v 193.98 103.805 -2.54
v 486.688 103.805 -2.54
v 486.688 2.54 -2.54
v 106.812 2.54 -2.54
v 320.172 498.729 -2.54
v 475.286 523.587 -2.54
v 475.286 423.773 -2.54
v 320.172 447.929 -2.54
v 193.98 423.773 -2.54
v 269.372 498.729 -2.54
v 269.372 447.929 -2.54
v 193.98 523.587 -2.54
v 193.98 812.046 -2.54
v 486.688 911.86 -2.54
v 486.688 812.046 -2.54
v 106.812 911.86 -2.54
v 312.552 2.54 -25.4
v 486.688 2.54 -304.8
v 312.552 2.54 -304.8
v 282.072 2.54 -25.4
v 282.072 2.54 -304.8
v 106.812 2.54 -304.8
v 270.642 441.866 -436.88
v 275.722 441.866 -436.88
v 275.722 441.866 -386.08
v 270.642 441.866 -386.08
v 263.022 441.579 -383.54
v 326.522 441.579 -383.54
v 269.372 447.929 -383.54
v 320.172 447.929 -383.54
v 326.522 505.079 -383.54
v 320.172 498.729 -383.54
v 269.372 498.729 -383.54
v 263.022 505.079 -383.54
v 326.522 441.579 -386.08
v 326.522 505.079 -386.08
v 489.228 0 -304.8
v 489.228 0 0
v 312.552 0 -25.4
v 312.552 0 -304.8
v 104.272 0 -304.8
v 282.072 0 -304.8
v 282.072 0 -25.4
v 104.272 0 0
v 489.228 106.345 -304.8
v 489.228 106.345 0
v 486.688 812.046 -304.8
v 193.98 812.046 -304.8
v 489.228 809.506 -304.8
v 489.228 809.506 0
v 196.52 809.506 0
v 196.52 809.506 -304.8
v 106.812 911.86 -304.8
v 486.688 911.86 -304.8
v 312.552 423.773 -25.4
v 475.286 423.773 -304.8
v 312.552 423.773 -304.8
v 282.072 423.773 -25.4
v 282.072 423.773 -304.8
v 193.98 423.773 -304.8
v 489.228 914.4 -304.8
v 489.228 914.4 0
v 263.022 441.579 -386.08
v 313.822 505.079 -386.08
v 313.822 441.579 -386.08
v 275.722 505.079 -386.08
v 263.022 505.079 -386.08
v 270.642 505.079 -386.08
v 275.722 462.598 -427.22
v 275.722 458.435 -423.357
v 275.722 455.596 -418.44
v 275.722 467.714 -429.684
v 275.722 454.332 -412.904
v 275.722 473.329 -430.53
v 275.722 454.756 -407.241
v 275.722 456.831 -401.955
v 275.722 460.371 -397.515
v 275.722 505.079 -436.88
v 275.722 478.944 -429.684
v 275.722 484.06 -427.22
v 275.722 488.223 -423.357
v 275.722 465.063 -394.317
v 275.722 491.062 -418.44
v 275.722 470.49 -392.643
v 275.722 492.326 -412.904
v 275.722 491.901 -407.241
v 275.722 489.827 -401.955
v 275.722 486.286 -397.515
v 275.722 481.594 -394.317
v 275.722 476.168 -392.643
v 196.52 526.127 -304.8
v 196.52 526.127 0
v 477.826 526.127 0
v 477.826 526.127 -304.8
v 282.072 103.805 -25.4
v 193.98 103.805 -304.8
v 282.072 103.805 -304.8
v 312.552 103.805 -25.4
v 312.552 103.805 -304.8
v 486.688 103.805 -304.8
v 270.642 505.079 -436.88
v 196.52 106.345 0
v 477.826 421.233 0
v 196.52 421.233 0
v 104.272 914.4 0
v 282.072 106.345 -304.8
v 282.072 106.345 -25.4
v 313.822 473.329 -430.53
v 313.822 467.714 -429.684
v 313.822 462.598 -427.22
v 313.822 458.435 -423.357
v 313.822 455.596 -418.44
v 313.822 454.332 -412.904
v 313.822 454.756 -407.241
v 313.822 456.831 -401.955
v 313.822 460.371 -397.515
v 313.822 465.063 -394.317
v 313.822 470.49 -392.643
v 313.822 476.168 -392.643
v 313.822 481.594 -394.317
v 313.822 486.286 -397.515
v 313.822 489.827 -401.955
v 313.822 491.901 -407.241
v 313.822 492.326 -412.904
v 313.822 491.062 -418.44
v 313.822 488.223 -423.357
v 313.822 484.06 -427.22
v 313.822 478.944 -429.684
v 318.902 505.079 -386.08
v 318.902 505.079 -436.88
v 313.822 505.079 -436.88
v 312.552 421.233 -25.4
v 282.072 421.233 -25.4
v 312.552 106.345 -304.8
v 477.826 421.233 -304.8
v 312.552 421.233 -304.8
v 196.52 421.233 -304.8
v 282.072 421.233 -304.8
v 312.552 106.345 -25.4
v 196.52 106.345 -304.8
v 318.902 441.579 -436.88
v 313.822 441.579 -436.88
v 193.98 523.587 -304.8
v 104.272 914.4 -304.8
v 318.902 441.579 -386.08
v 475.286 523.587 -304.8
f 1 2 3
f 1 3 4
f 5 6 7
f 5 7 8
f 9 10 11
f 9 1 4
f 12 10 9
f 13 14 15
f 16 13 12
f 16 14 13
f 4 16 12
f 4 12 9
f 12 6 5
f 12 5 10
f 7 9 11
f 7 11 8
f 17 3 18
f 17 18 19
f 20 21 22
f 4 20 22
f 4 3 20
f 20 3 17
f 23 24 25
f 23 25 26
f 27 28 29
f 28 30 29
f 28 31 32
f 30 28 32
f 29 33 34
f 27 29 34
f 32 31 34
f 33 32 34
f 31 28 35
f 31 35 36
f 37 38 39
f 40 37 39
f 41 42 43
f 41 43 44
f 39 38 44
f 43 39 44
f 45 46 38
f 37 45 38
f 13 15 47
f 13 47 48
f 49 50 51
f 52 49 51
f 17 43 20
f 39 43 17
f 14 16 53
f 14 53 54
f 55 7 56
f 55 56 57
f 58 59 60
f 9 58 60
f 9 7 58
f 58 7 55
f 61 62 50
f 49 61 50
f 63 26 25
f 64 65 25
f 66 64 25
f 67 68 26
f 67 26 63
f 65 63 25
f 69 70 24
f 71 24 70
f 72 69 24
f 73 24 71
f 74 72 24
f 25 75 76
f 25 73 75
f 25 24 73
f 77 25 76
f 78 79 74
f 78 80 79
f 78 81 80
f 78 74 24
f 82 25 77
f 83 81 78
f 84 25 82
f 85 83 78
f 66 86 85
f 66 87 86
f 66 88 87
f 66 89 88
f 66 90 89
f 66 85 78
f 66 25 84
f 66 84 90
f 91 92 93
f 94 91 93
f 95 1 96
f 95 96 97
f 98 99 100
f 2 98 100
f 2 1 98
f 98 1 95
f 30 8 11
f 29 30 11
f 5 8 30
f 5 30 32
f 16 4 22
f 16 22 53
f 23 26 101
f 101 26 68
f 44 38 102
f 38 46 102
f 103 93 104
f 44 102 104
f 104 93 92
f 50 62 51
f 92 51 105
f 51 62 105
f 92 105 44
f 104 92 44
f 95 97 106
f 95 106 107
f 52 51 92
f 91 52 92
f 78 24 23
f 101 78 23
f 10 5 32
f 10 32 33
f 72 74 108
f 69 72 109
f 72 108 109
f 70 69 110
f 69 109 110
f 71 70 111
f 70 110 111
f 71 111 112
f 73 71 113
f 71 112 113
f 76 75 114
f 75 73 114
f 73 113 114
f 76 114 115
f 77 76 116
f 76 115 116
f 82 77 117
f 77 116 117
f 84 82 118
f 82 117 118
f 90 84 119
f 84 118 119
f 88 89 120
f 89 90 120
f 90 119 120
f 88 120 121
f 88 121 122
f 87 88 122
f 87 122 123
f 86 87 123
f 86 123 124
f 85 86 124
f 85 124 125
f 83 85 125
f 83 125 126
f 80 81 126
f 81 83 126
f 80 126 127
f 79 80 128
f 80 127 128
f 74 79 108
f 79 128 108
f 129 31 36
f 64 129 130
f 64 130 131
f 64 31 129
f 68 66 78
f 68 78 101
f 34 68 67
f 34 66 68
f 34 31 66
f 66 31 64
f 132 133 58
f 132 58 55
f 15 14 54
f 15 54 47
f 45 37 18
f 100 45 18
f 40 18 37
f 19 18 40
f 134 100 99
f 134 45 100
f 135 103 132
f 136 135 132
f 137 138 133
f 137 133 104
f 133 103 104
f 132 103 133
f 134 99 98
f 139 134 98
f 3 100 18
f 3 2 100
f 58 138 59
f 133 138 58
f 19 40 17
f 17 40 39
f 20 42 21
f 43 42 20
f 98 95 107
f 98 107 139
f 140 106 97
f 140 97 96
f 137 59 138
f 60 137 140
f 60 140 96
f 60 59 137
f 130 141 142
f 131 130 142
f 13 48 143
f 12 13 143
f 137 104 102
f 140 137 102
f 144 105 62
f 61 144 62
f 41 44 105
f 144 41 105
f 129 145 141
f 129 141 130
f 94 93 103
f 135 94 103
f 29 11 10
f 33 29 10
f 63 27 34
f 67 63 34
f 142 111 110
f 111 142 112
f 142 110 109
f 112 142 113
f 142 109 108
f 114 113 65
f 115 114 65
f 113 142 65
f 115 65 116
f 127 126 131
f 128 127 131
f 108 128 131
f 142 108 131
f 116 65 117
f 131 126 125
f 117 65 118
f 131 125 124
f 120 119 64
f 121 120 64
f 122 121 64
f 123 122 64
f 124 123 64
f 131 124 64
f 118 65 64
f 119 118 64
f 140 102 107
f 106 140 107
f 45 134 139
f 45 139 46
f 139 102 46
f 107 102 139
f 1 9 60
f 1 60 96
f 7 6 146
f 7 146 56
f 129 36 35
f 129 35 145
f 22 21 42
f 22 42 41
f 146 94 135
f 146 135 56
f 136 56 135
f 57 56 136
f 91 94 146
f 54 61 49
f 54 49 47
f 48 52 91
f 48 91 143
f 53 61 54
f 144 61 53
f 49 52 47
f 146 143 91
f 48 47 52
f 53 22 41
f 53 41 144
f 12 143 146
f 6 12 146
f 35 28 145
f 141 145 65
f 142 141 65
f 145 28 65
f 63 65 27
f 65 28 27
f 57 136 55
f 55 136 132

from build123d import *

# Parameters (mm, degrees)
BOSS_EXTRUDE4_DEPTH = 304.8
SHELL1_T            = -2.54
SKETCH3_W           = 50.8
SKETCH3_H           = 50.8
BOSS_EXTRUDE5_DEPTH = 381
SKETCH4_W           = 63.5
SKETCH4_H           = 63.5
BOSS_EXTRUDE6_DEPTH = 2.54
SKETCH5_W           = 5.08
SKETCH5_H           = 63.5
SKETCH5_H_2         = 63.212567158
BOSS_EXTRUDE7_DEPTH = 50.8
BOSS_EXTRUDE8_REACH = 1036.844
SKETCH6_R           = 19.05
SKETCH7_W           = 30.48
SKETCH7_H           = 279.4
CUT_EXTRUDE1_DEPTH  = 431.8


with BuildPart() as part:
    # Sketch2 → Boss-Extrude4 (new body)
    with BuildSketch(Plane.XY):
        Polygon((489.227839492, 0), (104.27186579, 0), (104.27186579, 914.4), (489.227839492, 914.4), (489.227839492, 809.506234414), (196.520335525, 809.506234414), (196.520335525, 526.127227386), (477.826343233, 526.127227386), (477.826343233, 421.2334618), (196.520335525, 421.2334618), (196.520335525, 106.34486511), (489.227839492, 106.34486511), align=None)
    extrude(amount=-BOSS_EXTRUDE4_DEPTH)

    # Shell1
    shell1_openings = [part.faces().sort_by_distance(p)[0] for p in [
        (249.504622919, 459.117899523, -304.8),
    ]]
    offset(amount=SHELL1_T, openings=shell1_openings, kind=Kind.INTERSECTION)

    # Sketch3 → Boss-Extrude5 (add)
    with BuildSketch(Plane(origin=(0, 0, -2.54), x_dir=(-1, 0, 0), z_dir=(0, 0, -1))):
        with Locations((-294.77186579, 473.328769938)):
            Rectangle(SKETCH3_W, SKETCH3_H)
    extrude(amount=BOSS_EXTRUDE5_DEPTH)

    # Sketch4 → Boss-Extrude6 (add)
    with BuildSketch(Plane(origin=(0, 0, -383.54), x_dir=(-1, 0, 0), z_dir=(0, 0, -1))):
        with Locations((-294.77186579, 473.328769938)):
            Rectangle(SKETCH4_W, SKETCH4_H)
    extrude(amount=BOSS_EXTRUDE6_DEPTH)

    # Sketch5 → Boss-Extrude7 (add)
    with BuildSketch(Plane(origin=(0, 0, -386.08), x_dir=(-1, 0, 0), z_dir=(0, 0, -1))):
        with Locations((-316.36186579, 473.328769938)):
            Rectangle(SKETCH5_W, SKETCH5_H)
        with Locations((-273.18186579, 473.472486359)):
            Rectangle(SKETCH5_W, SKETCH5_H_2)
    extrude(amount=BOSS_EXTRUDE7_DEPTH)

    # Sketch6 → Boss-Extrude8 (add, up to next)
    with BuildSketch(Plane.ZY.offset(-313.82186579), mode=Mode.PRIVATE) as boss_extrude8_sk1:
        with Locations(Location((-411.48, 473.328769938, 0), (0, 0, 180))):
            Circle(SKETCH6_R)
    boss_extrude8_tool1 = extrude(boss_extrude8_sk1.sketch, amount=BOSS_EXTRUDE8_REACH, mode=Mode.PRIVATE) - part.part
    add(boss_extrude8_tool1.solids().sort_by_distance((313.821866, 473.32877, -411.48))[0])

    # Sketch7 → Cut-Extrude1 (cut)
    with BuildSketch(Plane.XZ):
        with Locations((297.31186579, -165.1)):
            Rectangle(SKETCH7_W, SKETCH7_H)
    extrude(amount=-CUT_EXTRUDE1_DEPTH, mode=Mode.SUBTRACT)


solid = part.part
